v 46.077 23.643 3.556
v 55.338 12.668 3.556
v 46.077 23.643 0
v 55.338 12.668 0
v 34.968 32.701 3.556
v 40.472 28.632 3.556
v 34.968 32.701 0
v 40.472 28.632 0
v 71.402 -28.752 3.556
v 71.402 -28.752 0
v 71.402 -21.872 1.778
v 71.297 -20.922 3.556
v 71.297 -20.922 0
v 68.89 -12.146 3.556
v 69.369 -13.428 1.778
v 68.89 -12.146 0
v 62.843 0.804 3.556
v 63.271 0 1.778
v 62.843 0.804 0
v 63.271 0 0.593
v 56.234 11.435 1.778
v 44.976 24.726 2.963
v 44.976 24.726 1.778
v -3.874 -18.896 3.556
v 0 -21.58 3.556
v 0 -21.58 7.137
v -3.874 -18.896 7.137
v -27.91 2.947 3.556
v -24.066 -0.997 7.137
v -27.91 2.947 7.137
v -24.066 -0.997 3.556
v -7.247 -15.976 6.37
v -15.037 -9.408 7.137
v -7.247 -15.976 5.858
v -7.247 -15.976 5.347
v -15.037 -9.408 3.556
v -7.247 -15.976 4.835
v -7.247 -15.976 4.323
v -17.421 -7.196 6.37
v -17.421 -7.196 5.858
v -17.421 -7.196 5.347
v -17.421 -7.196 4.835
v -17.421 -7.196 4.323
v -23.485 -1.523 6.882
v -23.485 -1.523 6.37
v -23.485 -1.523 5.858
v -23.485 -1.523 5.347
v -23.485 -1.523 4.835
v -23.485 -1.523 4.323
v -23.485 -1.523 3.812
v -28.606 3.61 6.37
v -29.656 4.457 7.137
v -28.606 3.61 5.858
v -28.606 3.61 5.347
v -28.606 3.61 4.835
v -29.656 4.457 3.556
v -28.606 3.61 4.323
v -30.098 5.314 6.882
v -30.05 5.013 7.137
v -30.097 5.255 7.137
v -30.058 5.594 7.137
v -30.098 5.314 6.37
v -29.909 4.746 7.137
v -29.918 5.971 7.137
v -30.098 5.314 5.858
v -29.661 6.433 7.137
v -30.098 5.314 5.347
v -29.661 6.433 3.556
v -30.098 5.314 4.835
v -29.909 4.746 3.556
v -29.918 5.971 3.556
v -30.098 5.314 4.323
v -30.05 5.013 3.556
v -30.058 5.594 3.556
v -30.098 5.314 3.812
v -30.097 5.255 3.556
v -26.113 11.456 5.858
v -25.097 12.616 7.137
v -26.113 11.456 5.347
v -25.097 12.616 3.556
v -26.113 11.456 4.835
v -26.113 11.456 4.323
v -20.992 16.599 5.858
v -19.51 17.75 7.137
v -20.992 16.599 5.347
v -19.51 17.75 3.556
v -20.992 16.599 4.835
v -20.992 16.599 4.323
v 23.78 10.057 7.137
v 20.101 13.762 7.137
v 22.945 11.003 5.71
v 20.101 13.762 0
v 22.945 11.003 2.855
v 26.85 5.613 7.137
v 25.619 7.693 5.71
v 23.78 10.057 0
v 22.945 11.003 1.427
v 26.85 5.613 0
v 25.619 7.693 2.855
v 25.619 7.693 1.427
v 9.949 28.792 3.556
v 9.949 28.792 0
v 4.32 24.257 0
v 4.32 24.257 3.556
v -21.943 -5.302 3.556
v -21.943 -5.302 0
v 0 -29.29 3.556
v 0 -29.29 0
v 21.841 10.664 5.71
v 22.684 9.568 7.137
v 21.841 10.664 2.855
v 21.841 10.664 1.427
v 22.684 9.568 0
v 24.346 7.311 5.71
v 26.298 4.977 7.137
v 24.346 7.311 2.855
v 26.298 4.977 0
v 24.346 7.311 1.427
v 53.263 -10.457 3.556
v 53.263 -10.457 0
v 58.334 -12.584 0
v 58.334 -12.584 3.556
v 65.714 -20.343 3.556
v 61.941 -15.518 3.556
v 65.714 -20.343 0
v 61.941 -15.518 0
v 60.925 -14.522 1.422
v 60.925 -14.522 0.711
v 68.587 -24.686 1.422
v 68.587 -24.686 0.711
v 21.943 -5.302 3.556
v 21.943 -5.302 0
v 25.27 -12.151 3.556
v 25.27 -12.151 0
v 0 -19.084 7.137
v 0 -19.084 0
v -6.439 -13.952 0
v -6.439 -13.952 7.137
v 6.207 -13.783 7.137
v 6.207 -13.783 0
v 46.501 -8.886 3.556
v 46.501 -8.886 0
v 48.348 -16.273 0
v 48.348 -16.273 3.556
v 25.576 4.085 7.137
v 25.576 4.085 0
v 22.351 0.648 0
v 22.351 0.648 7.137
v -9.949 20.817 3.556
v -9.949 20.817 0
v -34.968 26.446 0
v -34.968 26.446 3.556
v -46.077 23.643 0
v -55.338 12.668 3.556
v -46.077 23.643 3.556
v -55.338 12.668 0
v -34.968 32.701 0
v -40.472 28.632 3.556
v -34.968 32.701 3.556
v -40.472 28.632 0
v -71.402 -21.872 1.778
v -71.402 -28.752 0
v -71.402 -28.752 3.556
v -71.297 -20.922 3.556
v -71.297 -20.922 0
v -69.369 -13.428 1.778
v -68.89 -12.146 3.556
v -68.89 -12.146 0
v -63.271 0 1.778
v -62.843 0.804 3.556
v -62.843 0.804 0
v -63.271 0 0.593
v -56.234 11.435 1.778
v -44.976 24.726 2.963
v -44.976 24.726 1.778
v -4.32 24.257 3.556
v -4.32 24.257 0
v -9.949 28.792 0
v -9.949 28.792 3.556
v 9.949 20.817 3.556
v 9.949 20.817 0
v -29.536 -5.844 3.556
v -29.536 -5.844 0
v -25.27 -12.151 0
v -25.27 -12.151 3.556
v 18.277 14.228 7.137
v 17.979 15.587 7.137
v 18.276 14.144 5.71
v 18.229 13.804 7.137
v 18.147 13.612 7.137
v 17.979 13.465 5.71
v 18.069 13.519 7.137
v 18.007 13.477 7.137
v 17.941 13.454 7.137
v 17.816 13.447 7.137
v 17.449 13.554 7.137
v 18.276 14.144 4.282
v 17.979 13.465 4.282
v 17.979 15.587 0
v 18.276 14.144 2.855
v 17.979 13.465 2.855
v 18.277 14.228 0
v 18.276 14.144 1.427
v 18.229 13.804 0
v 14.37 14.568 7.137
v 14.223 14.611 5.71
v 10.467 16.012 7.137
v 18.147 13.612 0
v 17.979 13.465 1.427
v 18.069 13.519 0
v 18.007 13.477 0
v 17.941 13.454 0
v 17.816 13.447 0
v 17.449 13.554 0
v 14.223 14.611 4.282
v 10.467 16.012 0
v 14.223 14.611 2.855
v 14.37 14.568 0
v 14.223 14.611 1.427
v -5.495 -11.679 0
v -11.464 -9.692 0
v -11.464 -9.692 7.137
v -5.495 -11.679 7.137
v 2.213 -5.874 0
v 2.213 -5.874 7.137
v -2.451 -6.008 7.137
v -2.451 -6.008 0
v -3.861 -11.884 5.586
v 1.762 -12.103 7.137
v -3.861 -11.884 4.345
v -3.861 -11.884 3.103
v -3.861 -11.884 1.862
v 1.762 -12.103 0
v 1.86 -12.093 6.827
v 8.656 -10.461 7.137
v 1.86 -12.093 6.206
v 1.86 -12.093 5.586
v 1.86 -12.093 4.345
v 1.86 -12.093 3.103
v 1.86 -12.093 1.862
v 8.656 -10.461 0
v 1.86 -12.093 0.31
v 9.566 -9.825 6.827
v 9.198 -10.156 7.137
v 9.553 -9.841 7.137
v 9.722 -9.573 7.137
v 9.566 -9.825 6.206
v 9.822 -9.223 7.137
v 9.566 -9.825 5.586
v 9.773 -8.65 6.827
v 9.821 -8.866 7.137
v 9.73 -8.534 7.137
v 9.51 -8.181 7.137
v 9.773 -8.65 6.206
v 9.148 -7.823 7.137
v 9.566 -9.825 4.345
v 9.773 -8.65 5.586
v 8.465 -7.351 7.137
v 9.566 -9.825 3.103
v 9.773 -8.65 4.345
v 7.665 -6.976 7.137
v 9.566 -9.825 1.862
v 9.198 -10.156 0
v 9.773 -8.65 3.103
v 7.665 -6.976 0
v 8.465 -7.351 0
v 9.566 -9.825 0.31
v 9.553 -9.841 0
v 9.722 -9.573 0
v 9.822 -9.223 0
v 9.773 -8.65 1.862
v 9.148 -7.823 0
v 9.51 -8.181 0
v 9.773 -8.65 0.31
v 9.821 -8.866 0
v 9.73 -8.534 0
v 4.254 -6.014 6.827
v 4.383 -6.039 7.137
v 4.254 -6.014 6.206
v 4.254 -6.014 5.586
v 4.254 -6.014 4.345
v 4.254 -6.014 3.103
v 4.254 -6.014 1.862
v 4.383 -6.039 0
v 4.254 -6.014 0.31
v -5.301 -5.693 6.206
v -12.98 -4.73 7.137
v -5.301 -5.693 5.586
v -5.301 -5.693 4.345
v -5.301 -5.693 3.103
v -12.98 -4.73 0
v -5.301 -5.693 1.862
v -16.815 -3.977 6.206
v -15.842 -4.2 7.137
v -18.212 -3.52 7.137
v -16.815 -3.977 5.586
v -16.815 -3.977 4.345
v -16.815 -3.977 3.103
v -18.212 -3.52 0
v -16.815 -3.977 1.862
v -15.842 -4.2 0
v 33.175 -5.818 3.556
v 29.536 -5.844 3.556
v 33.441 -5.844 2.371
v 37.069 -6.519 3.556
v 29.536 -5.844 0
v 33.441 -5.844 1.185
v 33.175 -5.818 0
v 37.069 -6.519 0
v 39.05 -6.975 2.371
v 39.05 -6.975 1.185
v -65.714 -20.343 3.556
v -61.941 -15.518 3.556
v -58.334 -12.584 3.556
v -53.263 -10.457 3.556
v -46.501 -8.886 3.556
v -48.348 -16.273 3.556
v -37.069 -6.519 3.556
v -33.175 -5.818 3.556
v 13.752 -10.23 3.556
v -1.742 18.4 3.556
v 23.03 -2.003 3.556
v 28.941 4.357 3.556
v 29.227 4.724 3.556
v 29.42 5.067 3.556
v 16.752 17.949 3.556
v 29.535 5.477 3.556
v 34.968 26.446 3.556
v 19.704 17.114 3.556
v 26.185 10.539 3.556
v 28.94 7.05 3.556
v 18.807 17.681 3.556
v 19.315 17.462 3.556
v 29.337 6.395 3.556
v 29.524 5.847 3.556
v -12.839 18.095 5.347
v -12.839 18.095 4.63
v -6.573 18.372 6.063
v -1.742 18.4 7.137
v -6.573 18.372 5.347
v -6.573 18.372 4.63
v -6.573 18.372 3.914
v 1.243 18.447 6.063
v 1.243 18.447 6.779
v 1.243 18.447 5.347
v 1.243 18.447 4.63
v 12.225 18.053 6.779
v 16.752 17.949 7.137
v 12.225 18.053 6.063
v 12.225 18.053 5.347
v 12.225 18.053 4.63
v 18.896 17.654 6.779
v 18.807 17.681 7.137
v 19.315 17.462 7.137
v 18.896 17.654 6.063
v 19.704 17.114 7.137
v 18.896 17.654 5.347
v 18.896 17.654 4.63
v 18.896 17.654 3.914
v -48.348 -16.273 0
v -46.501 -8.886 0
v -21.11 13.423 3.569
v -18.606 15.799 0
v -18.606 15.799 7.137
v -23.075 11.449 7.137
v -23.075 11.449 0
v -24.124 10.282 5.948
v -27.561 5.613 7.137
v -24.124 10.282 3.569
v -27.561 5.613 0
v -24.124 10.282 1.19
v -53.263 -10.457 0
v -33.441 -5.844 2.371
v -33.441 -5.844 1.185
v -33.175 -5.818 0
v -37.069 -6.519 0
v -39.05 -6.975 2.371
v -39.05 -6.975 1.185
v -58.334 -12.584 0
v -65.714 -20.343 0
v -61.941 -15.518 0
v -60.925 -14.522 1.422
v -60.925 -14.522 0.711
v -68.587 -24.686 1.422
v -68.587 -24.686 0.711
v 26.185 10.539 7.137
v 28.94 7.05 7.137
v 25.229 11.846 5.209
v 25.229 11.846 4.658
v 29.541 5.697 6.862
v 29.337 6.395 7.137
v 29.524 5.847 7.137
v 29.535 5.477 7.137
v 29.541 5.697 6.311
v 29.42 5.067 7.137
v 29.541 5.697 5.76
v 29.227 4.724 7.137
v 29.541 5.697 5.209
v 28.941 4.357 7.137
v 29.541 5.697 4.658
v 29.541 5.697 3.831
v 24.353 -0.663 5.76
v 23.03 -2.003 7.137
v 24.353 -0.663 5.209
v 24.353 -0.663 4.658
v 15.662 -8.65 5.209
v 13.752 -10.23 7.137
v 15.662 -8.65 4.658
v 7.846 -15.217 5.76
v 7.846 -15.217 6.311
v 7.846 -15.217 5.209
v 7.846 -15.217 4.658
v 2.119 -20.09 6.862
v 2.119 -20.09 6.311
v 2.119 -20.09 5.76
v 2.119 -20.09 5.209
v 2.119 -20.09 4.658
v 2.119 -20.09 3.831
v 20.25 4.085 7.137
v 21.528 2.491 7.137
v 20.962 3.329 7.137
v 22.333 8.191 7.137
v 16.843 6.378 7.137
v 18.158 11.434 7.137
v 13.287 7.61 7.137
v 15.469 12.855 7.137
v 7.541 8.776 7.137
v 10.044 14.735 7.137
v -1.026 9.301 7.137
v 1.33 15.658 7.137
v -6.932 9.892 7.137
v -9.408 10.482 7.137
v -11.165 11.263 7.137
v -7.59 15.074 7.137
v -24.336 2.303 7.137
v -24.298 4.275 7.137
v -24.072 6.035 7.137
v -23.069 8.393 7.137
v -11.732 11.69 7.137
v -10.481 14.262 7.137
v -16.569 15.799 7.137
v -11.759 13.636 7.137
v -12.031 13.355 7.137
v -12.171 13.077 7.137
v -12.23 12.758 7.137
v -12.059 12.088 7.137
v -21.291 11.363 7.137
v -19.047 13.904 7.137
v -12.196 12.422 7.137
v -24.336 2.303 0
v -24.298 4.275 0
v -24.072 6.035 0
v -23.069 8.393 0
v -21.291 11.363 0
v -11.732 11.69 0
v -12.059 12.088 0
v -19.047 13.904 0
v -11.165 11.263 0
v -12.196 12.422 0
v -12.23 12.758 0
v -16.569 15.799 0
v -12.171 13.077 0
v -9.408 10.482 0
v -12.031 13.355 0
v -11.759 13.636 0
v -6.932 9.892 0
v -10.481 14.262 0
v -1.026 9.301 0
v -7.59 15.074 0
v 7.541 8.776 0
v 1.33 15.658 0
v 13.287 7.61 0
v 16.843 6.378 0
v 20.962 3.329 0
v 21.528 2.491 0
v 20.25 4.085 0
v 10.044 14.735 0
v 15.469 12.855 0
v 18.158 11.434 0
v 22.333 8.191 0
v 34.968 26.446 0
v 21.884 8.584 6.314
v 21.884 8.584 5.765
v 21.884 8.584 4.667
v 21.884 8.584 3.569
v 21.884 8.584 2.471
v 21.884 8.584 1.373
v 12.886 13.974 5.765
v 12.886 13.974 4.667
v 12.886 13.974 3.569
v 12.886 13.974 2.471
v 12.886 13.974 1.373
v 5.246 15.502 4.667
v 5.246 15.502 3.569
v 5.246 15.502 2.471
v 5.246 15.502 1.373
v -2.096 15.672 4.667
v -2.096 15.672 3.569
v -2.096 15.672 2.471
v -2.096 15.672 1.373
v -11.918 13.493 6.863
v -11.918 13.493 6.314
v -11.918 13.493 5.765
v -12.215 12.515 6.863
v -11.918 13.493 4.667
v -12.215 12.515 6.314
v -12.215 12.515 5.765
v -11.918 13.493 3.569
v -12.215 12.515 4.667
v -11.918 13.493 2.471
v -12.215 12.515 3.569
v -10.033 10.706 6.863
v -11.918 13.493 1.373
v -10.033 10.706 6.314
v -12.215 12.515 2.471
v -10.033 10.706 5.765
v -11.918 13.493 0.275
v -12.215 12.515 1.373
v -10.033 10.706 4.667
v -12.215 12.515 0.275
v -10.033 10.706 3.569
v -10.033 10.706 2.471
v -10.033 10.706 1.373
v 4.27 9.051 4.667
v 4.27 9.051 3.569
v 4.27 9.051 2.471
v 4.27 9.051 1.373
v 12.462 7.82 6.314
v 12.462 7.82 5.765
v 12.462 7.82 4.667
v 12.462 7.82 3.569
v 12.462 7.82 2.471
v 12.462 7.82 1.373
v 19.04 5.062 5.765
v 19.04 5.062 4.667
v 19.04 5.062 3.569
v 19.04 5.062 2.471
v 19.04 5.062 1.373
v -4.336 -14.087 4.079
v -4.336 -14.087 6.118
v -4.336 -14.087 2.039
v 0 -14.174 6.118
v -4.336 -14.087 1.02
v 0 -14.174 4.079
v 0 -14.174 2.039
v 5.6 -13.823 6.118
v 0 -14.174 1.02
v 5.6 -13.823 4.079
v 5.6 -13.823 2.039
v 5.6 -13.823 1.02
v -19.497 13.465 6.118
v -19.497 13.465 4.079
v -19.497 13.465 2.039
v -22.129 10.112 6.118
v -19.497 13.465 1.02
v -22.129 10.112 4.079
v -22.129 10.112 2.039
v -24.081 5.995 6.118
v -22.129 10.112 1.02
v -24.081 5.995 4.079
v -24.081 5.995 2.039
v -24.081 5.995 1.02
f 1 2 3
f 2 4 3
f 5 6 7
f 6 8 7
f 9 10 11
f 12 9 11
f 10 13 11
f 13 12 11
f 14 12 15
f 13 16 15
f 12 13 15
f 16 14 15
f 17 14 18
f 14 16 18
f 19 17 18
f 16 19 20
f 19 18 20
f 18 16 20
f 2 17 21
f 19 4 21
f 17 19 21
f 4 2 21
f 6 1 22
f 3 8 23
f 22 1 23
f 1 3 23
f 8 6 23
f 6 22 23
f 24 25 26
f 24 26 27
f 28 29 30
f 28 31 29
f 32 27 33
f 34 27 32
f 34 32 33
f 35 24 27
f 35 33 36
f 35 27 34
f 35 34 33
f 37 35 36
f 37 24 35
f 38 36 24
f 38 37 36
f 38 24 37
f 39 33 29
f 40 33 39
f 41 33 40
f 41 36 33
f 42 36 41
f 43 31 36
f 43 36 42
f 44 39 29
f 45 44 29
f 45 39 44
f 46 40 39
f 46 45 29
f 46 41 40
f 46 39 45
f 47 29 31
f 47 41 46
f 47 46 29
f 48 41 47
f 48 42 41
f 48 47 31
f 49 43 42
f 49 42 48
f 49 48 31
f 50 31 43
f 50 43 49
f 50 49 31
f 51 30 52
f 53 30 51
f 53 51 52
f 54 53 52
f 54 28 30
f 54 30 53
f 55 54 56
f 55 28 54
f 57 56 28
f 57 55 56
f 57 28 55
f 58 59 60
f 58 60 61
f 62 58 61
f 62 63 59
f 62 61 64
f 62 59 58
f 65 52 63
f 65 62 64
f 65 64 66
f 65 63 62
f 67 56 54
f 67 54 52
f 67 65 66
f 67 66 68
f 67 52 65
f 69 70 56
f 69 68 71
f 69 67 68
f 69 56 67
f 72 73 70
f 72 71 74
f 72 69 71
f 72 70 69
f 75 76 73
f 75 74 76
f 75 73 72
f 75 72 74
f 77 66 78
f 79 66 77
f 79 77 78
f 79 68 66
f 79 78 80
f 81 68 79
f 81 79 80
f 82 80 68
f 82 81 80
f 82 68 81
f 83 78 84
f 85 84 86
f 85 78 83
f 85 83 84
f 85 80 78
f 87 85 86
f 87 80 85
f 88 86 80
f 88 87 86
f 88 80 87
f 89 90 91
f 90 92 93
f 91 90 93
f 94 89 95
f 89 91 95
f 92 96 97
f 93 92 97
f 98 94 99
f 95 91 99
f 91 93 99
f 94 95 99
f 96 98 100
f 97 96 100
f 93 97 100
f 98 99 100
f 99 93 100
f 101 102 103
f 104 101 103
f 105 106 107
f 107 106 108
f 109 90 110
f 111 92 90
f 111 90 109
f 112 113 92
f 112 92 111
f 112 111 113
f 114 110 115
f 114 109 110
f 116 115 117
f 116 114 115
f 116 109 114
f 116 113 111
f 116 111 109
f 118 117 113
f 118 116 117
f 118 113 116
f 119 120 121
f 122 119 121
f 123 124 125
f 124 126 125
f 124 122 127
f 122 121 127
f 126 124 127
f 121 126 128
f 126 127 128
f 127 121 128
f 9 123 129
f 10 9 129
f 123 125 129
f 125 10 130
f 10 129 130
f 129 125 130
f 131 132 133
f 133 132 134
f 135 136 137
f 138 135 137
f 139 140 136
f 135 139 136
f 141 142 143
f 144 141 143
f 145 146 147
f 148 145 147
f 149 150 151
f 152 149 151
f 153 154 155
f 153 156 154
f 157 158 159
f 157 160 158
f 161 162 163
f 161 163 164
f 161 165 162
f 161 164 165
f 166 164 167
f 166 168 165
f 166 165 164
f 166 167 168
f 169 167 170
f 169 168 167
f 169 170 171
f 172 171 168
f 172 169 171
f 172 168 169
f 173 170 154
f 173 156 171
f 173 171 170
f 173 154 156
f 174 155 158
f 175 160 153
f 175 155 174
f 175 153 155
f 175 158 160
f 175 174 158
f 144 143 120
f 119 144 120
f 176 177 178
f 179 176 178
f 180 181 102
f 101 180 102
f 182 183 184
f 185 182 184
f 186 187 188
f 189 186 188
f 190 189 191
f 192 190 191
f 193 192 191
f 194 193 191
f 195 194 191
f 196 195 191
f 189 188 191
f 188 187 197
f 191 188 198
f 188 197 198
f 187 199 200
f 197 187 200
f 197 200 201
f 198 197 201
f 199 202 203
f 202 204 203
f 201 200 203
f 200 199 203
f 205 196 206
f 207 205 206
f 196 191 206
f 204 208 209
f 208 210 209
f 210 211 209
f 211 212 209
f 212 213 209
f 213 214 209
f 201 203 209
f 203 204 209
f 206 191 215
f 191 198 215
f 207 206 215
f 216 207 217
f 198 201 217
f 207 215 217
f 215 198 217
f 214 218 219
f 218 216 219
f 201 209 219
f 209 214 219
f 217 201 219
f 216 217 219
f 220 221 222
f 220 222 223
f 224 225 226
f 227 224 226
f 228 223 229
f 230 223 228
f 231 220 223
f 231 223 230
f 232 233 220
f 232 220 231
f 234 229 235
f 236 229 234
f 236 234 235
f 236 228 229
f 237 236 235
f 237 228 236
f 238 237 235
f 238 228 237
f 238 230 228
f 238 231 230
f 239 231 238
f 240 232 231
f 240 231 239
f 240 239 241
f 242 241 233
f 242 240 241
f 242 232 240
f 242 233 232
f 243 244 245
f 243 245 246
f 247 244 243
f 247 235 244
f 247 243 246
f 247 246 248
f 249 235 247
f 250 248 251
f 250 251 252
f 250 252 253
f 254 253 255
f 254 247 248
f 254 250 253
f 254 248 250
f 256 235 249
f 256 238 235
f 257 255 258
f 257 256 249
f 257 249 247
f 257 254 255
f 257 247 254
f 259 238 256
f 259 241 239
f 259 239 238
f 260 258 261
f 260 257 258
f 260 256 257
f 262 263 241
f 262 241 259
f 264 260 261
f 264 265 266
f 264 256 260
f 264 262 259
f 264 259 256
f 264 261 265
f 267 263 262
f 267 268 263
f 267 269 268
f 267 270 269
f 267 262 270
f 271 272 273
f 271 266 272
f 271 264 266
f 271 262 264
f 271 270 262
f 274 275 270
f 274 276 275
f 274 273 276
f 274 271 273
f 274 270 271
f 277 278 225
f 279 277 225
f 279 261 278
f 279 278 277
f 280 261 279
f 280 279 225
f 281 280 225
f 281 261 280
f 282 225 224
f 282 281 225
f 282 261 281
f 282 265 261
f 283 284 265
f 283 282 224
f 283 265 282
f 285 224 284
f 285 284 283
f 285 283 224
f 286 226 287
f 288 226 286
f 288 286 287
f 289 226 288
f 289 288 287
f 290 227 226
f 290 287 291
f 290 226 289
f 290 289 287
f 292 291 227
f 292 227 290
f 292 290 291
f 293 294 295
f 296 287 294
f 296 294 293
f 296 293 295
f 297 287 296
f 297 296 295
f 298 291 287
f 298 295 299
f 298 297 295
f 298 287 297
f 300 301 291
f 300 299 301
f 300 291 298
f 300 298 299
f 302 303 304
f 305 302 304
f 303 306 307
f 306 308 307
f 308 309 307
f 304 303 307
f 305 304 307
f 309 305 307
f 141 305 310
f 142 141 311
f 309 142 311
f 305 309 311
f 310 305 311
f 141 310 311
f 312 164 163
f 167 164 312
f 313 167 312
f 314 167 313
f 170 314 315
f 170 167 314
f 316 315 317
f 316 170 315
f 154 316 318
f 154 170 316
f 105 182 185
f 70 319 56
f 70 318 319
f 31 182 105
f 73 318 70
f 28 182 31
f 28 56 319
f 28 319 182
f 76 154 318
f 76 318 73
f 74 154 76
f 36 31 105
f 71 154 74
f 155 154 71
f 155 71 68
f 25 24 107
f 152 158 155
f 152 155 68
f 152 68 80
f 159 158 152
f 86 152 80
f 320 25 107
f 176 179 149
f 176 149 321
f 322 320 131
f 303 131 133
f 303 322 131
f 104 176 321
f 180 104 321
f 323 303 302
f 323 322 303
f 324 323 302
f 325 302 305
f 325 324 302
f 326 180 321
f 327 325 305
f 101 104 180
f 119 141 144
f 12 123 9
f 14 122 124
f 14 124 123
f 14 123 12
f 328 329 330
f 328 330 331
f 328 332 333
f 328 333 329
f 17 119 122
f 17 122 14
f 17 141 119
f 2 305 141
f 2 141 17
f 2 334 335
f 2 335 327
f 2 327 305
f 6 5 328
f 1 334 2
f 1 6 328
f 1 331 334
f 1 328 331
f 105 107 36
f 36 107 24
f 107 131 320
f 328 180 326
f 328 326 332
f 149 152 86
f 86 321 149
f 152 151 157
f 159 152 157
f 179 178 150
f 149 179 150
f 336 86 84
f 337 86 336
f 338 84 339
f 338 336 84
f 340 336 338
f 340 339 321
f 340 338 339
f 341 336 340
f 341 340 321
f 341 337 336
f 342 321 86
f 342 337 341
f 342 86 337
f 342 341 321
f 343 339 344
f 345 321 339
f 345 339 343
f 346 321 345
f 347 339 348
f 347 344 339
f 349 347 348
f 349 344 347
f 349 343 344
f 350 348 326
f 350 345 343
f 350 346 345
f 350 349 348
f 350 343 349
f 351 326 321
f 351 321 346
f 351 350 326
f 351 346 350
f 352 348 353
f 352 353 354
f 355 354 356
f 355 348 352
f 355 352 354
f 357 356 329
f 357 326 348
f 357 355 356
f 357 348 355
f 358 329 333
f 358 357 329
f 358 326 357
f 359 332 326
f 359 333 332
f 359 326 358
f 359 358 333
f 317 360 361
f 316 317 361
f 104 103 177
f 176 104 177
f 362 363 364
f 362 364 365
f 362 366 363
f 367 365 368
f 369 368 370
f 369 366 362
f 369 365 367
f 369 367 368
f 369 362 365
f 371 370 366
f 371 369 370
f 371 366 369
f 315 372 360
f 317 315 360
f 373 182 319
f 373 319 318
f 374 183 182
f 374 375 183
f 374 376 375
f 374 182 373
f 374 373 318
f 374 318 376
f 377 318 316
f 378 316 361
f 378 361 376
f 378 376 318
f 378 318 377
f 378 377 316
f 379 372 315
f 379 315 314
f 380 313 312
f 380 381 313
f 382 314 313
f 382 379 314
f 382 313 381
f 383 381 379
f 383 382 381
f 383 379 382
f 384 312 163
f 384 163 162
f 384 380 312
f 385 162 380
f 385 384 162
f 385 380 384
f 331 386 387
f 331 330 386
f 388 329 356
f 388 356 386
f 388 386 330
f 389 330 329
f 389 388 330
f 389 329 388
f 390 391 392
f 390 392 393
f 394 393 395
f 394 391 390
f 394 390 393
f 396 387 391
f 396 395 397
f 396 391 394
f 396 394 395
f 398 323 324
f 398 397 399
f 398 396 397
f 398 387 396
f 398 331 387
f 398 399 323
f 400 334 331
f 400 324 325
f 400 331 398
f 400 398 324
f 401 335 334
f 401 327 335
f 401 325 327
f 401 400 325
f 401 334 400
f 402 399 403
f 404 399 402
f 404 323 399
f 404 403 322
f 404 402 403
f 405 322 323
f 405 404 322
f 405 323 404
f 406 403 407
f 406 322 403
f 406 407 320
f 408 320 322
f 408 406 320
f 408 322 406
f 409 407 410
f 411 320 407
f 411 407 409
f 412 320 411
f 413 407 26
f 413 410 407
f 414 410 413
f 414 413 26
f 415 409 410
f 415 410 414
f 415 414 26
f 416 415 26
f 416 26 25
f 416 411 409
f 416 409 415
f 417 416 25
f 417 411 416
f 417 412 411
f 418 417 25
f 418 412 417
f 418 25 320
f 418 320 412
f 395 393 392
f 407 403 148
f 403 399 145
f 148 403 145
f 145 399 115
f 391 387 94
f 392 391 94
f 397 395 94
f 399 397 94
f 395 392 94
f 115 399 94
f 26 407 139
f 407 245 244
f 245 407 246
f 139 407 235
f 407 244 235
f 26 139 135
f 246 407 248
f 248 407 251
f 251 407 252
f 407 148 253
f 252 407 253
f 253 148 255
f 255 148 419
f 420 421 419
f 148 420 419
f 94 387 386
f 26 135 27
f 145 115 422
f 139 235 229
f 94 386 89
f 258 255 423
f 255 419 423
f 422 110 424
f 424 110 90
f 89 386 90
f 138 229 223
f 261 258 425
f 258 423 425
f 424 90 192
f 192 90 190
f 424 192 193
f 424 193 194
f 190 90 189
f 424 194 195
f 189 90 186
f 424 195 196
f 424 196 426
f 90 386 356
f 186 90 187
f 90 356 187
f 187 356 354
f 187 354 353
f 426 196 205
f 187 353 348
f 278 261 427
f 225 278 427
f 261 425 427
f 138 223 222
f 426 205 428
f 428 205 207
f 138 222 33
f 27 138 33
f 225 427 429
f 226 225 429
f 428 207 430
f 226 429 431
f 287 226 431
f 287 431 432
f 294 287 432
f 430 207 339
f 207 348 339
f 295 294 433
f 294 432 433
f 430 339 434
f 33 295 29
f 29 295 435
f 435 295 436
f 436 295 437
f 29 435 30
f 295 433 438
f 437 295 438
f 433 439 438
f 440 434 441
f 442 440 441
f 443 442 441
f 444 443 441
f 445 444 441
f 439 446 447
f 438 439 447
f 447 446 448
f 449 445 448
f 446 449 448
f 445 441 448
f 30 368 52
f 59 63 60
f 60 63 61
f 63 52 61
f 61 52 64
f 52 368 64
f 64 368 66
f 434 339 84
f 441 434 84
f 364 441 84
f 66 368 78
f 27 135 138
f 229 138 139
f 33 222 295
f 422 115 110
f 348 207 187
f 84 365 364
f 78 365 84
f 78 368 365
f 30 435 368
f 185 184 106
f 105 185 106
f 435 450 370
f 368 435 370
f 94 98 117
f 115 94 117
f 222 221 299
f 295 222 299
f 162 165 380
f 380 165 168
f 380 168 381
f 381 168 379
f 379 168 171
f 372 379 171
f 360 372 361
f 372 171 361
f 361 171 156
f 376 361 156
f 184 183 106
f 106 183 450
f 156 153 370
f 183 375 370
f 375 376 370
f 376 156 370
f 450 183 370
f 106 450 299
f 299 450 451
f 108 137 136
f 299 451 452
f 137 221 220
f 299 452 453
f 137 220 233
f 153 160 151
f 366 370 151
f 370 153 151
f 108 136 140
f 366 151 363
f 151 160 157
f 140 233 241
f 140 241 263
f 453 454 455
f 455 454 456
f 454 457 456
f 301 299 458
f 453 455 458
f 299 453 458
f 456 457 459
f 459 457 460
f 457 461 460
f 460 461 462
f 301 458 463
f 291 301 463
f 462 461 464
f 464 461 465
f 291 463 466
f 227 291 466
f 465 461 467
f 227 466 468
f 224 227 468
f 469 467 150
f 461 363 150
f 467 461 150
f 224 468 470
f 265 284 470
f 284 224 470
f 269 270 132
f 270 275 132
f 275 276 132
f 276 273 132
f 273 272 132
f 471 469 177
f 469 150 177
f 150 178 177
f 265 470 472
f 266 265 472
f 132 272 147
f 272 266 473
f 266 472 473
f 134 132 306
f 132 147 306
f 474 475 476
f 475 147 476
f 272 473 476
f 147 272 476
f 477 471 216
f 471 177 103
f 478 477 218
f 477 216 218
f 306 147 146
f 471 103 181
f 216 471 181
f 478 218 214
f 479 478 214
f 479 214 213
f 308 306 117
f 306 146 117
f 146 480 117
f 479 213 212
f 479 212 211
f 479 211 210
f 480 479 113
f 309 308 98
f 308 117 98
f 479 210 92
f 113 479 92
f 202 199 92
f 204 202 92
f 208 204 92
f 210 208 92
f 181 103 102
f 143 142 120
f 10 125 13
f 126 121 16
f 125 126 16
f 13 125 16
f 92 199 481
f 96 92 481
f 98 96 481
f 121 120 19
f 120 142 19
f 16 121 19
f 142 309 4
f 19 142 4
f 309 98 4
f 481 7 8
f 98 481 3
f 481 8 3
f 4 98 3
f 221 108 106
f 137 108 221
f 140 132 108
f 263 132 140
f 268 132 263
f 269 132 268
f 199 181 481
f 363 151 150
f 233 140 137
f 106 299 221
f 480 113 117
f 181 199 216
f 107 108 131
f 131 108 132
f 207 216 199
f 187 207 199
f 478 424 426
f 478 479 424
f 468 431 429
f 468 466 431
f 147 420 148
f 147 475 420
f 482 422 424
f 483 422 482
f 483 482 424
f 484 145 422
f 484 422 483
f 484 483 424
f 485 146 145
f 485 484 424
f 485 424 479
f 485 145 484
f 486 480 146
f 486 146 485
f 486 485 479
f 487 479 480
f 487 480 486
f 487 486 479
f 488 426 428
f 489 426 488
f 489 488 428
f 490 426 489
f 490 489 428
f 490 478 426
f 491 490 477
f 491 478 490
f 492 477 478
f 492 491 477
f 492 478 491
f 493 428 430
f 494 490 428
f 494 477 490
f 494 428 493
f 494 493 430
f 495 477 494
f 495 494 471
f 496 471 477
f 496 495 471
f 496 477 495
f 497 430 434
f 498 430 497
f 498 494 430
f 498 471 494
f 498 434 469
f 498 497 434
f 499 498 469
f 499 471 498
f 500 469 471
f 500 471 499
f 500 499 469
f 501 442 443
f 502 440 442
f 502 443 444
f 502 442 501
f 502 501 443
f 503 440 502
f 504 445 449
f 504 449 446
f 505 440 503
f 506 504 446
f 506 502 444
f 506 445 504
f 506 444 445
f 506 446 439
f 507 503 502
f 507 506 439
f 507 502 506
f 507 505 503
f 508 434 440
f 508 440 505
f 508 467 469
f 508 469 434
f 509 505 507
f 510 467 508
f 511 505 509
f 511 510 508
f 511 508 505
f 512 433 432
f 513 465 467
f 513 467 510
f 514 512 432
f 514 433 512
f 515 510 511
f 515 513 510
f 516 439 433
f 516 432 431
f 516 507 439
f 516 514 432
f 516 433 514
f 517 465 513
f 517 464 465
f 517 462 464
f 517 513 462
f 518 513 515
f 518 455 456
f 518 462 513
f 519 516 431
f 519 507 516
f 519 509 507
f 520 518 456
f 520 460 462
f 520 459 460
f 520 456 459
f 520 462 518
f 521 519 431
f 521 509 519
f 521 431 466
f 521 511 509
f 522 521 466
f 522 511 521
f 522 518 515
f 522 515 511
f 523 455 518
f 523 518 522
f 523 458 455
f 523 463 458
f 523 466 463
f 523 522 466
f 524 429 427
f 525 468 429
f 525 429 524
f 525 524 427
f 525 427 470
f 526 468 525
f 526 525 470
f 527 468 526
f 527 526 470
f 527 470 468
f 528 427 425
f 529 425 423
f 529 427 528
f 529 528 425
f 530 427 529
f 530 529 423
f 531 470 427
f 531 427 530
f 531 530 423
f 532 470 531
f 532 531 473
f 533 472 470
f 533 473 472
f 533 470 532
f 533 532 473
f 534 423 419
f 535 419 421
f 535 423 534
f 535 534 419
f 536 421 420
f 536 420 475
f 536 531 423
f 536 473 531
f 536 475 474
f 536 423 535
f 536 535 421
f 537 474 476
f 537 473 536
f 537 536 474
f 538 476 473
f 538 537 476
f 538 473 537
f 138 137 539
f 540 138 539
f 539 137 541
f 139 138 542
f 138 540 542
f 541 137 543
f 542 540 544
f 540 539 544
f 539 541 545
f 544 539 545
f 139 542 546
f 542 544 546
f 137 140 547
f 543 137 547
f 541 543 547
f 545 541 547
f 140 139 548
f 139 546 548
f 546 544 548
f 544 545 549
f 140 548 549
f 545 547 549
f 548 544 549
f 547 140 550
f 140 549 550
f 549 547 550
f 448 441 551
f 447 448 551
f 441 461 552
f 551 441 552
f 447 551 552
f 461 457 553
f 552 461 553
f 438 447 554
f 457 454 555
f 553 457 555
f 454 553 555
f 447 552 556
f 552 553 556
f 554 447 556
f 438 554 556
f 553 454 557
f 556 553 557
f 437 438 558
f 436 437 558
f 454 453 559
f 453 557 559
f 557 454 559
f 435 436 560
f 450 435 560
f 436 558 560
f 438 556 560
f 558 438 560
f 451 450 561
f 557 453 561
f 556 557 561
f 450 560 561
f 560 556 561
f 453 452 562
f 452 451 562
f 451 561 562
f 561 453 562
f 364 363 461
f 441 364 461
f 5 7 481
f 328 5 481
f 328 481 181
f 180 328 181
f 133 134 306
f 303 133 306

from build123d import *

# Parameters (mm, degrees)
F1_DEPTH = 7.1374
F2_DEPTH = 3.556


with BuildPart() as f1:
    # F0 (on Top) → F1 (new body)
    with BuildSketch(Plane.XY):
        with BuildLine():
            add(Edge.make_bspline(
                [(-19.5095837116, 17.750132829), (-18.5764965966, 17.7563244168), (-16.5913074056, 17.7694973275), (-12.7987040255, 18.1260969536), (-10.2427380873, 18.2242756955), (-6.4947569706, 18.4217557716), (-2.9396242918, 18.3271077498), (1.3161403141, 18.5325250144), (5.846850049, 18.2057147503), (11.8438965539, 18.015196782), (18.8615107913, 18.0311999967), (19.5219533199, 17.3121916236), (19.704317674, 17.1136558056)],
                knots=[0, 0, 0, 0, 0.088549754, 0.1883940006, 0.2721447417, 0.3706621273, 0.469143676, 0.5746760878, 0.683605617, 0.8156261821, 0.9490898742, 1, 1, 1, 1], degree=3))
            add(Edge.make_bspline(
                [(0, -21.5800683945), (-0.3319907115, -21.3889658164), (-1.1946565288, -20.8923927014), (-4.0630738776, -18.8589188134), (-7.2175668974, -15.8937927891), (-13.3098833623, -11.0321718092), (-17.3409245354, -7.3052803614), (-20.4295617413, -4.2726588061), (-23.4480572764, -1.5618833972), (-26.6496266133, 1.3461765476), (-28.3398688396, 3.6329043291), (-30.8788410113, 5.0560047788), (-28.4107816367, 7.9854169873), (-26.4861625524, 11.4795888482), (-21.1223594469, 16.604521381), (-19.9161718462, 17.4613189465), (-19.5095837116, 17.750132829)],
                knots=[0, 0, 0, 0, 0.0415191894, 0.1078861071, 0.1853875086, 0.2869787673, 0.373296012, 0.4478025234, 0.5214848259, 0.5968328798, 0.6593857253, 0.7126689374, 0.7746164892, 0.8522262076, 0.9501876237, 1, 1, 1, 1], degree=3))
            add(Edge.make_bspline(
                [(19.704317674, 17.1136558056), (20.4660764924, 16.40732859), (22.1023067283, 14.8901634207), (25.4707250683, 11.9054874951), (26.9231641299, 9.1399257151), (30.6149308579, 5.641689151), (27.5673209338, 3.210433105), (24.3913064484, -0.8597774947), (20.589660928, -4.21014052), (15.6986794339, -8.7354987119), (11.5981846852, -11.9044730513), (7.9107016082, -15.273535089), (4.8758837066, -17.4439363568), (2.2180895591, -20.1630638064), (0.6931811647, -21.1372364599), (0, -21.5800683945)],
                knots=[0, 0, 0, 0, 0.0681244273, 0.1463287922, 0.2158358485, 0.2916692257, 0.356262669, 0.4423588831, 0.5280034165, 0.6244272982, 0.7110380194, 0.7939908084, 0.8671133434, 0.9395934026, 1, 1, 1, 1], degree=3))
        make_face()
        with BuildLine():
            Line((0, -19.083738327), (-6.4387861639, -13.9518929645))
            add(Edge.make_bspline(
                [(-6.4387861639, -13.9518929645), (-6.1993659016, -13.9673186417), (-5.6421838004, -14.0032174881), (-4.2811490717, -14.0937063824), (-2.1762200386, -14.2053752649), (0.0594619608, -14.1818923498), (2.3691048655, -14.0994803383), (5.5369254985, -13.8201330822), (6.0495213503, -13.7918771204), (6.2066861428, -13.7832136825)],
                knots=[0, 0, 0, 0, 0.0959642163, 0.2233292335, 0.3838923159, 0.5468704707, 0.7205857063, 0.9143299944, 1, 1, 1, 1], degree=3))
            Line((6.2066861428, -13.7832136825), (0, -19.083738327))
        make_face(mode=Mode.SUBTRACT)
        with BuildLine():
            Line((-11.4640093252, -9.6921403307), (-18.2115975767, -3.51992785))
            add(Edge.make_bspline(
                [(-11.4640093252, -9.6921403307), (-11.1925595515, -9.8285623281), (-10.5262751021, -10.163415639), (-8.5022286167, -10.7540533189), (-6.0773711883, -11.6504044762), (-3.9052776575, -11.8927662396), (-0.2793776442, -12.1984498059), (1.8428122139, -12.1528920689), (5.0167442566, -11.6344167356), (8.1292689781, -10.7865623805), (9.8254254509, -9.8813245338), (9.8989069755, -8.5842157481), (9.1635058152, -7.7569593745), (7.8371665028, -6.9350394151), (5.8327304198, -6.4638838348), (4.2807621724, -5.931599683), (2.1067005646, -5.8212474651), (-0.003827204, -6.0393083847), (-2.4786113395, -6.0887757908), (-5.309917662, -5.6031236679), (-9.2150709767, -5.5379207737), (-12.1547418159, -4.8701897095), (-14.3487475828, -4.484430802), (-16.8070690828, -4.0355286744), (-17.785227272, -3.6764479075), (-18.2115975767, -3.51992785)],
                knots=[0, 0, 0, 0, 0.0293297987, 0.0719911773, 0.1191083424, 0.1633727176, 0.2186624769, 0.2621485317, 0.3145140775, 0.3683061575, 0.4069954722, 0.4370838071, 0.4668753002, 0.5034877254, 0.5455047079, 0.583408482, 0.6261202043, 0.6691976568, 0.7148179234, 0.7649204909, 0.8232397475, 0.8741483333, 0.9182916333, 0.9643840622, 1, 1, 1, 1], degree=3))
        make_face(mode=Mode.SUBTRACT)
        with BuildLine():
            Line((-18.6061039567, 15.7994572073), (-16.5688730776, 15.7994572073))
            add(Edge.make_bspline(
                [(-16.5688730776, 15.7994572073), (-16.8816761775, 15.6268844843), (-17.6507158673, 15.2026071246), (-19.5698724625, 13.4530156399), (-20.8642747146, 11.9839312137), (-22.1846082354, 10.1283207834), (-23.1955549411, 8.1357541164), (-24.3243720211, 5.9975006156), (-24.3317234691, 3.6245676167), (-24.3358183652, 2.3027989082)],
                knots=[0, 0, 0, 0, 0.1037814483, 0.2551510929, 0.390540135, 0.5317956505, 0.6729482527, 0.8178259707, 1, 1, 1, 1], degree=3))
            Line((-24.3358183652, 2.3027989082), (-27.5614354759, 5.613300018))
            add(Edge.make_bspline(
                [(-18.6061039567, 15.7994572073), (-18.8480500596, 15.5694385267), (-19.4412791552, 15.0054543492), (-21.1486136054, 13.4078939803), (-22.7448424038, 11.7912604684), (-24.1659861022, 10.3302251487), (-26.2192004031, 7.5135805738), (-27.1438340233, 6.2045227752), (-27.5614354759, 5.613300018)],
                knots=[0, 0, 0, 0, 0.1181070001, 0.2895872593, 0.4588269477, 0.6201606114, 0.8284493696, 1, 1, 1, 1], degree=3))
        make_face(mode=Mode.SUBTRACT)
        with BuildLine():
            add(Edge.make_bspline(
                [(25.5763512105, 4.085376393), (25.3186117542, 4.4467346235), (24.7455779446, 5.2501447273), (23.5800084636, 7.0042181418), (21.9064864262, 8.6460441764), (19.9773363571, 10.0126293664), (17.7387365257, 11.8890244394), (14.9156926035, 13.0721572234), (12.9348526983, 14.083510194), (8.8840783919, 15.0214431267), (5.387097953, 15.5984301581), (0.5180509573, 15.6638074044), (-2.0183458944, 15.7467776041), (-7.5837591411, 15.2644309862), (-10.7514336718, 14.2160924736), (-12.2408771691, 13.4615689342), (-12.3371315684, 11.8576332104), (-9.9436794222, 10.5195219763), (-7.1518033629, 9.9142792079), (-3.4223539456, 9.2504854024), (1.0941950879, 9.3355661475), (4.256295495, 9.0286435447), (8.1118177079, 8.8178212962), (12.4391418659, 7.866493923), (16.3001767562, 6.7948016187), (19.0513926717, 5.1591107001), (21.3478997584, 3.2063806384), (22.0208015061, 1.4894074512), (22.3507359624, 0.6475481205)],
                knots=[0, 0, 0, 0, 0.0261676702, 0.0581787514, 0.0920006719, 0.1259607075, 0.1639011804, 0.2020622058, 0.2353139567, 0.2794356763, 0.3226269021, 0.3701897439, 0.4066230356, 0.4585000072, 0.4995684305, 0.5260601319, 0.5501584831, 0.5849164575, 0.622849035, 0.6660402642, 0.7129376131, 0.7524215564, 0.7954719532, 0.8423818089, 0.8865958886, 0.9259816305, 0.9637076132, 1, 1, 1, 1], degree=3))
            Line((25.5763512105, 4.085376393), (22.3507359624, 0.6475481205))
        make_face(mode=Mode.SUBTRACT)
        with BuildLine():
            add(Edge.make_bspline(
                [(20.1012920588, 13.7622253969), (20.2452048268, 13.4425032395), (20.5937728481, 12.6681110761), (21.8163123463, 10.5807281257), (23.0209503907, 9.2077312684), (24.3314473915, 7.2320467017), (25.6129651562, 5.7622151271), (26.2978710234, 4.9766651355)],
                knots=[0, 0, 0, 0, 0.1494031829, 0.361866237, 0.5504956727, 0.759762869, 1, 1, 1, 1], degree=3))
            add(Edge.make_bspline(
                [(20.1012920588, 13.7622253969), (20.4750730429, 13.3760628597), (21.2843709261, 12.5399568584), (23.0054821127, 11.0445287637), (24.383345844, 9.3014615168), (25.6774875683, 7.7238205109), (26.4476910831, 6.3370082248), (26.8496219069, 5.613300018)],
                knots=[0, 0, 0, 0, 0.1781124497, 0.3856430226, 0.5907250332, 0.7864197951, 1, 1, 1, 1], degree=3))
            Line((26.8496219069, 5.613300018), (26.2978710234, 4.9766651355))
        make_face(mode=Mode.SUBTRACT)
        with BuildLine():
            add(Edge.make_bspline(
                [(17.9791748524, 15.5872460455), (18.1335643678, 15.0886235141), (18.3974618909, 14.2363295572), (18.0569729416, 13.1625353099), (16.6570122906, 14.0339334557), (14.1077114542, 14.5340834733), (11.7591107639, 15.4872345416), (10.466885753, 16.0116683692)],
                knots=[0, 0, 0, 0, 0.1776907916, 0.3037263227, 0.4672843646, 0.706894207, 1, 1, 1, 1], degree=3))
            Line((10.466885753, 16.0116683692), (17.9791748524, 15.5872460455))
        make_face(mode=Mode.SUBTRACT)
    extrude(amount=F1_DEPTH)

    # F0 (on Top) → F2 (join)
    with BuildSketch(Plane.XY):
        with BuildLine():
            Line((-21.9426061958, -5.3016319871), (0, -29.2897354811))
            Line((0, -29.2897354811), (21.9426061958, -5.3016319871))
            Line((21.9426061958, -5.3016319871), (25.2695303128, -12.1511807173))
            Line((25.2695303128, -12.1511807173), (29.5361573841, -5.8439915397))
            add(Edge.make_bspline(
                [(29.5361573841, -5.8439915397), (30.8085593289, -5.7578560404), (33.5548119661, -5.6176687882), (39.226288166, -7.0898518959), (43.9203490864, -7.9866895348), (46.5012626113, -8.8855231766)],
                knots=[0, 0, 0, 0, 0.2767038179, 0.6116548947, 1, 1, 1, 1], degree=3))
            Line((46.5012626113, -8.8855231766), (48.3481176198, -16.2729360163))
            Line((48.3481176198, -16.2729360163), (53.263142705, -10.4568144307))
            add(Edge.make_bspline(
                [(53.263142705, -10.4568144307), (54.3915338128, -10.8062275975), (56.8484551687, -11.5670282327), (61.2348281764, -14.3464137244), (65.2363326588, -19.4586534824), (68.5115306821, -24.6608758261), (70.4754479584, -27.4406396667), (71.4018642902, -28.7519060075)],
                knots=[0, 0, 0, 0, 0.167262552, 0.3641919307, 0.5878831242, 0.8055967993, 1, 1, 1, 1], degree=3))
            add(Edge.make_bspline(
                [(71.4018642902, -28.7519060075), (71.5089216785, -26.4726334151), (71.7362620233, -21.6325133105), (69.6735176256, -13.1324512433), (63.2967501182, 0.4855632474), (56.6553617612, 11.4528973101), (45.4263510597, 25.239962007), (38.2706242276, 30.3448056276), (34.9680520594, 32.7008366585)],
                knots=[0, 0, 0, 0, 0.1259530501, 0.2674659854, 0.4518702183, 0.627819287, 0.8282279783, 1, 1, 1, 1], degree=3))
            Line((34.9680520594, 32.7008366585), (34.9680520594, 26.4461040497))
            Line((34.9680520594, 26.4461040497), (9.9491244182, 20.8168458194))
            Line((9.9491244182, 20.8168458194), (9.9491244182, 28.7916306406))
            Line((9.9491244182, 28.7916306406), (4.3198643252, 24.2569483817))
            Line((4.3198643252, 24.2569483817), (0, 24.2569483817))
            Line((0, 24.2569483817), (-4.3198643252, 24.2569483817))
            Line((-4.3198643252, 24.2569483817), (-9.9491244182, 28.7916306406))
            Line((-9.9491244182, 28.7916306406), (-9.9491244182, 20.8168458194))
            Line((-9.9491244182, 20.8168458194), (-34.9680520594, 26.4461040497))
            Line((-34.9680520594, 26.4461040497), (-34.9680520594, 32.7008366585))
            add(Edge.make_bspline(
                [(-71.4018642902, -28.7519060075), (-71.5089216785, -26.4726334151), (-71.7362620233, -21.6325133105), (-69.6735176256, -13.1324512433), (-63.2967501182, 0.4855632474), (-56.6553617612, 11.4528973101), (-45.4263510597, 25.239962007), (-38.2706242276, 30.3448056276), (-34.9680520594, 32.7008366585)],
                knots=[0, 0, 0, 0, 0.1259530501, 0.2674659854, 0.4518702183, 0.627819287, 0.8282279783, 1, 1, 1, 1], degree=3))
            add(Edge.make_bspline(
                [(-53.263142705, -10.4568144307), (-54.3915338128, -10.8062275975), (-56.8484551687, -11.5670282327), (-61.2348281764, -14.3464137244), (-65.2363326588, -19.4586534824), (-68.5115306821, -24.6608758261), (-70.4754479584, -27.4406396667), (-71.4018642902, -28.7519060075)],
                knots=[0, 0, 0, 0, 0.167262552, 0.3641919307, 0.5878831242, 0.8055967993, 1, 1, 1, 1], degree=3))
            Line((-53.263142705, -10.4568144307), (-48.3481176198, -16.2729360163))
            Line((-48.3481176198, -16.2729360163), (-46.5012626113, -8.8855231766))
            add(Edge.make_bspline(
                [(-29.5361573841, -5.8439915397), (-30.8085593289, -5.7578560404), (-33.5548119661, -5.6176687882), (-39.226288166, -7.0898518959), (-43.9203490864, -7.9866895348), (-46.5012626113, -8.8855231766)],
                knots=[0, 0, 0, 0, 0.2767038179, 0.6116548947, 1, 1, 1, 1], degree=3))
            Line((-29.5361573841, -5.8439915397), (-25.2695303128, -12.1511807173))
            Line((-25.2695303128, -12.1511807173), (-21.9426061958, -5.3016319871))
        make_face()
        with BuildLine():
            add(Edge.make_bspline(
                [(0, -21.5800683945), (-0.3319907115, -21.3889658164), (-1.1946565288, -20.8923927014), (-4.0630738776, -18.8589188134), (-7.2175668974, -15.8937927891), (-13.3098833623, -11.0321718092), (-17.3409245354, -7.3052803614), (-20.4295617413, -4.2726588061), (-23.4480572764, -1.5618833972), (-26.6496266133, 1.3461765476), (-28.3398688396, 3.6329043291), (-30.8788410113, 5.0560047788), (-28.4107816367, 7.9854169873), (-26.4861625524, 11.4795888482), (-21.1223594469, 16.604521381), (-19.9161718462, 17.4613189465), (-19.5095837116, 17.750132829)],
                knots=[0, 0, 0, 0, 0.0415191894, 0.1078861071, 0.1853875086, 0.2869787673, 0.373296012, 0.4478025234, 0.5214848259, 0.5968328798, 0.6593857253, 0.7126689374, 0.7746164892, 0.8522262076, 0.9501876237, 1, 1, 1, 1], degree=3))
            add(Edge.make_bspline(
                [(-19.5095837116, 17.750132829), (-18.5764965966, 17.7563244168), (-16.5913074056, 17.7694973275), (-12.7987040255, 18.1260969536), (-10.2427380873, 18.2242756955), (-6.4947569706, 18.4217557716), (-2.9396242918, 18.3271077498), (1.3161403141, 18.5325250144), (5.846850049, 18.2057147503), (11.8438965539, 18.015196782), (18.8615107913, 18.0311999967), (19.5219533199, 17.3121916236), (19.704317674, 17.1136558056)],
                knots=[0, 0, 0, 0, 0.088549754, 0.1883940006, 0.2721447417, 0.3706621273, 0.469143676, 0.5746760878, 0.683605617, 0.8156261821, 0.9490898742, 1, 1, 1, 1], degree=3))
            add(Edge.make_bspline(
                [(19.704317674, 17.1136558056), (20.4660764924, 16.40732859), (22.1023067283, 14.8901634207), (25.4707250683, 11.9054874951), (26.9231641299, 9.1399257151), (30.6149308579, 5.641689151), (27.5673209338, 3.210433105), (24.3913064484, -0.8597774947), (20.589660928, -4.21014052), (15.6986794339, -8.7354987119), (11.5981846852, -11.9044730513), (7.9107016082, -15.273535089), (4.8758837066, -17.4439363568), (2.2180895591, -20.1630638064), (0.6931811647, -21.1372364599), (0, -21.5800683945)],
                knots=[0, 0, 0, 0, 0.0681244273, 0.1463287922, 0.2158358485, 0.2916692257, 0.356262669, 0.4423588831, 0.5280034165, 0.6244272982, 0.7110380194, 0.7939908084, 0.8671133434, 0.9395934026, 1, 1, 1, 1], degree=3))
        make_face(mode=Mode.SUBTRACT)
    extrude(amount=F2_DEPTH)


solid = f1.part
